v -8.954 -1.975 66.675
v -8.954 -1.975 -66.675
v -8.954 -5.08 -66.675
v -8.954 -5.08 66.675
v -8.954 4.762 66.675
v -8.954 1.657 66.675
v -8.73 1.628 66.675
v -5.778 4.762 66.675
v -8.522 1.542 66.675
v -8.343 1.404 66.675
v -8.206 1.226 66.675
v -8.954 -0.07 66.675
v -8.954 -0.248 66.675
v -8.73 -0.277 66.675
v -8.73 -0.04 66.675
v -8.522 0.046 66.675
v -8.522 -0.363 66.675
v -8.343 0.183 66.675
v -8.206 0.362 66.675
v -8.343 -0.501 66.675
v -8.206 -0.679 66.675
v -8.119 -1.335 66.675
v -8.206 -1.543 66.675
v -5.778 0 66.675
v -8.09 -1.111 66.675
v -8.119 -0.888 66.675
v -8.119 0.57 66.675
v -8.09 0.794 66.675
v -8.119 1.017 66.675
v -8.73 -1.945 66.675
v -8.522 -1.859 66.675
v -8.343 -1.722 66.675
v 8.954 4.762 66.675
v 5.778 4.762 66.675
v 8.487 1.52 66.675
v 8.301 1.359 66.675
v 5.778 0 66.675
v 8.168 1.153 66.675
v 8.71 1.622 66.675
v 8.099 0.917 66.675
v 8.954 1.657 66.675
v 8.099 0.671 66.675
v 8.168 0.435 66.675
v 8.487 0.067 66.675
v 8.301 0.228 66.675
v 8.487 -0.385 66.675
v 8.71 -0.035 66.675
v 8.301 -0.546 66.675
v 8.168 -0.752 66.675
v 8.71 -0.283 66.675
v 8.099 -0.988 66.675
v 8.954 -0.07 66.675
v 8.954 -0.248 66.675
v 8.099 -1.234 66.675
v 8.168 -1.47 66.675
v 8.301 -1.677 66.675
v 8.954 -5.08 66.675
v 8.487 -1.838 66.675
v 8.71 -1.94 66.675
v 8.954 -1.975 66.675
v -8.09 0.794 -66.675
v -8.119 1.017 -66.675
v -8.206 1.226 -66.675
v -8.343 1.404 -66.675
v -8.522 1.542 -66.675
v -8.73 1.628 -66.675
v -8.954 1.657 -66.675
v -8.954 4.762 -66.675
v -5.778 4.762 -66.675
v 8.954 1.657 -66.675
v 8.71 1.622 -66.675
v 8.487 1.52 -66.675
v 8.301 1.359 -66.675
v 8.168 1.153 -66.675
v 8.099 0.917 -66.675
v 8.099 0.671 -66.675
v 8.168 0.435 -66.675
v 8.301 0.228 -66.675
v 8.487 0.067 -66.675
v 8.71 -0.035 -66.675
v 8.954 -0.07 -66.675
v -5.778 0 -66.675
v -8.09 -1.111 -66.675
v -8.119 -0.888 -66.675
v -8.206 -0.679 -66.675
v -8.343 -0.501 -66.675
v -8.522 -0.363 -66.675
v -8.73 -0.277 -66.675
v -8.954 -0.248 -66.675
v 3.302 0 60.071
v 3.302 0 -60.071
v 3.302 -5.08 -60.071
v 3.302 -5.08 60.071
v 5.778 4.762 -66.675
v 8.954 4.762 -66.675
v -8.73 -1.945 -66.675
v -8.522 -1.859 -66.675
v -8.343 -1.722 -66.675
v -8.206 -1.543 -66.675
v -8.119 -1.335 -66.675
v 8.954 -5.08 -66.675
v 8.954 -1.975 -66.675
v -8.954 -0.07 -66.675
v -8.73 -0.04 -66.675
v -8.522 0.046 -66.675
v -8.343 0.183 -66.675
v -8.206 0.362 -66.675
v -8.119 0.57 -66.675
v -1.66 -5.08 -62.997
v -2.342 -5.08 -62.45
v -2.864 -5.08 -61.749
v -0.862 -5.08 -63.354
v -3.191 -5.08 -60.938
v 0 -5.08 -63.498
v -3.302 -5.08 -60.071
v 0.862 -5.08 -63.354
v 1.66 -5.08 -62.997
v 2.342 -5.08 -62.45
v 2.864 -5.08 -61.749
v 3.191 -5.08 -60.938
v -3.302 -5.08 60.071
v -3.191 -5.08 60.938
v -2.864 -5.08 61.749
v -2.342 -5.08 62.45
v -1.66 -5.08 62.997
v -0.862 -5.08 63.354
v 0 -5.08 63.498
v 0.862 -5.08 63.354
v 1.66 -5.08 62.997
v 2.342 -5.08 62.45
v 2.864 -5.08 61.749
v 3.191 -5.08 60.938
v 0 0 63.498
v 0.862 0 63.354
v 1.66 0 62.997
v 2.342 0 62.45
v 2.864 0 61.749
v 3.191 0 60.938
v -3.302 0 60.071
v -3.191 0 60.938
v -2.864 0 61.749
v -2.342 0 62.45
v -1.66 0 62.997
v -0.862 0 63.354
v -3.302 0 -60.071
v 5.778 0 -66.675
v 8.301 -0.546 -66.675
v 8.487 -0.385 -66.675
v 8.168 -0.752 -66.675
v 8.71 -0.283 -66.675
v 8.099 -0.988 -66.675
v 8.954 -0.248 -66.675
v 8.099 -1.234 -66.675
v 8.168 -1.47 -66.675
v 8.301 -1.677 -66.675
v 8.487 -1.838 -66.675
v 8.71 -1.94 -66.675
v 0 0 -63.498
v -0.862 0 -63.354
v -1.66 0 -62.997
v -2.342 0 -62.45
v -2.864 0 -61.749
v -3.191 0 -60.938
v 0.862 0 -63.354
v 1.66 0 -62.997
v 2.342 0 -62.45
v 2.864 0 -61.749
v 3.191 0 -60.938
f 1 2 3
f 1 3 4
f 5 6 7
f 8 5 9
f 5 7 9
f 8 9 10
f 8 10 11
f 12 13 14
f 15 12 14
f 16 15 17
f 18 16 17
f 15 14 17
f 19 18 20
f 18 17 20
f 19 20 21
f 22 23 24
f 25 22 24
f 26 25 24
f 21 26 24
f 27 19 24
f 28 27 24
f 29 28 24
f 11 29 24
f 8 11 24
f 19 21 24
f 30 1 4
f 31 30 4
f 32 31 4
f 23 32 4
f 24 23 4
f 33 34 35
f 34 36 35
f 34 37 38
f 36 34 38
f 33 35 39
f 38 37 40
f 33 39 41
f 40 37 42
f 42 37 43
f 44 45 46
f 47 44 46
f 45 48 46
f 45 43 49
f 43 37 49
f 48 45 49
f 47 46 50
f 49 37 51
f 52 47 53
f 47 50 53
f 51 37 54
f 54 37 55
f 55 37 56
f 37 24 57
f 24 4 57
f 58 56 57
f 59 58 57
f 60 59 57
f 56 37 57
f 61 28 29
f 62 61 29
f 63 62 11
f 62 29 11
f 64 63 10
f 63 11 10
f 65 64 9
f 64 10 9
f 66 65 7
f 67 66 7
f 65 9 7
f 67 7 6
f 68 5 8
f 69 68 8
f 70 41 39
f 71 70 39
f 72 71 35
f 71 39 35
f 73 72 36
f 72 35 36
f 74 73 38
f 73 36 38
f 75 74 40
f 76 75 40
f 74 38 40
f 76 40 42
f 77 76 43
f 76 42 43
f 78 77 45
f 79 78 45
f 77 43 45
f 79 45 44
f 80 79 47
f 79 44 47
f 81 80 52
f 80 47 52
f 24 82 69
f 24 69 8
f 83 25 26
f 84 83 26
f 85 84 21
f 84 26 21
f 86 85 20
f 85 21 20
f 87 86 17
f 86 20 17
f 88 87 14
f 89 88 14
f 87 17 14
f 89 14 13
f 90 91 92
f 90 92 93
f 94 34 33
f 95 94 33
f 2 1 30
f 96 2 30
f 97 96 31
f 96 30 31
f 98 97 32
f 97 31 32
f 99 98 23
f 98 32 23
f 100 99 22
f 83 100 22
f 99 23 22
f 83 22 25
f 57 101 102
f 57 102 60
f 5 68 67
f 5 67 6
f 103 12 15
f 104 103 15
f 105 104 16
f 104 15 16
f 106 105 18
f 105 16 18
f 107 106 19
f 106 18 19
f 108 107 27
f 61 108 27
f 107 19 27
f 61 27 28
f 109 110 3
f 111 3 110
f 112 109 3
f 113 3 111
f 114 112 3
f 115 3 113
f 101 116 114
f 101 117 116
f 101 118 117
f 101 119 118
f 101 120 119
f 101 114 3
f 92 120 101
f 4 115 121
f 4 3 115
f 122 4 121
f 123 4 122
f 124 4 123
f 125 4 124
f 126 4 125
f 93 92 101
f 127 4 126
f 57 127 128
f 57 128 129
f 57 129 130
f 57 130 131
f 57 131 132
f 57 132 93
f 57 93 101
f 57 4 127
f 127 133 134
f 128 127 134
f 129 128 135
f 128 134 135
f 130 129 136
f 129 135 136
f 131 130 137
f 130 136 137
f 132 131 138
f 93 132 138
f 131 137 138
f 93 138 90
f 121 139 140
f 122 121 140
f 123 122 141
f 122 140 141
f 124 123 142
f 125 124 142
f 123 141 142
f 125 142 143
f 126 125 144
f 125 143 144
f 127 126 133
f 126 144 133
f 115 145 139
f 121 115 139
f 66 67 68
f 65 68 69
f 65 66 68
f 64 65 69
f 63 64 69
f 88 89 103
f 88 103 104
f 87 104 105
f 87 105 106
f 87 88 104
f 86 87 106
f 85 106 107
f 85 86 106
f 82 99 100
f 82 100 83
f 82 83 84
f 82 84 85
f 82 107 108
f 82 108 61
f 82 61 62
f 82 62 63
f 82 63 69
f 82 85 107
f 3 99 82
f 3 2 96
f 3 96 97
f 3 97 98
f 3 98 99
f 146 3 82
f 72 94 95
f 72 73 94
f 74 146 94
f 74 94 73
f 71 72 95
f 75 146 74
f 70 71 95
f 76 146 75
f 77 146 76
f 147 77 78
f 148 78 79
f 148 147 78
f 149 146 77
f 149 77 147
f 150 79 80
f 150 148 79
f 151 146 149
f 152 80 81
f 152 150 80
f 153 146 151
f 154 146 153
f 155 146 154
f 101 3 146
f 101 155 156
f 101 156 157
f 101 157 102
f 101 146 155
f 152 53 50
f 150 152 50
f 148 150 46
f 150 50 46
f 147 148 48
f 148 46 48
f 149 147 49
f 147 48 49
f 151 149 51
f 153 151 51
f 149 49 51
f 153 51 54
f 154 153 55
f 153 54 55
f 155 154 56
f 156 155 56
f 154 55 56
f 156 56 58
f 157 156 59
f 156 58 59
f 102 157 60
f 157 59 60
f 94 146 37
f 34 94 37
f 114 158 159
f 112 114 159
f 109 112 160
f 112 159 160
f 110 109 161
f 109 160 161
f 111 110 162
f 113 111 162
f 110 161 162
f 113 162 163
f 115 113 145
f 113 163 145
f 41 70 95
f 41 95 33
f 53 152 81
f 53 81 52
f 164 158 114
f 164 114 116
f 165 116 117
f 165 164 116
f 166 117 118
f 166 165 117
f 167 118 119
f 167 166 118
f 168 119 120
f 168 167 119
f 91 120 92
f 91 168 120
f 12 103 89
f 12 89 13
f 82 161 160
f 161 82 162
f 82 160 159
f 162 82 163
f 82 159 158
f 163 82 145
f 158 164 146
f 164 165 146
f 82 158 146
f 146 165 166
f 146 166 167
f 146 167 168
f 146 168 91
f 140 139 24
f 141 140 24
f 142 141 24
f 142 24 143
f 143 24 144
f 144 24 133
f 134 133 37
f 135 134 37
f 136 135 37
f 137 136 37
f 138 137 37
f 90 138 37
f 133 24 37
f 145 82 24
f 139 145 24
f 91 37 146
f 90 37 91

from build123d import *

# Parameters (mm, degrees)
F0_W        = 11.557
F0_H        = 133.35
F0_W_2      = 6.604
F0_H_2      = 127
F0_W_3      = 3.175
F1_DEPTH    = 5.08
F2_T1_DEPTH = 5.08
F3_DEPTH    = 4.7625
F5_DEPTH    = 133.351


# Not quite as in the source:
# - a fillet or chamfer that OpenCascade refuses, or shapes differently, is made with other operations: its cross-section is extruded or revolved along the edge and cut away or added


with BuildPart() as f1:
    # F0 (on Front) → F1 (new body)
    with BuildSketch(Plane.XZ):
        Rectangle(F0_W, F0_H)
        Rectangle(F0_W_2, F0_H_2, mode=Mode.SUBTRACT)
        with Locations((-7.366, 0)):
            Rectangle(F0_W_3, F0_H)
        with Locations((7.366, 0)):
            Rectangle(F0_W_3, F0_H)
    extrude(amount=F1_DEPTH)

    # F2: fillet of radius 3.429 on 4 edges, made by hand

    # F2_s2 → F2_t1 (join)
    with BuildSketch(Plane.XZ):
        with BuildLine():
            ThreePointArc((-0.127, 63.5), (2.2976691527, 62.4956691527), (3.302, 60.071))
            Line((3.302, 60.071), (3.302, 63.5))
            Line((3.302, 63.5), (-0.127, 63.5))
        make_face()
        with BuildLine():
            ThreePointArc((-3.302, 60.071), (-2.2976691527, 62.4956691527), (0.127, 63.5))
            Line((0.127, 63.5), (-3.302, 63.5))
            Line((-3.302, 63.5), (-3.302, 60.071))
        make_face()
        with BuildLine():
            ThreePointArc((0.127, -63.5), (-2.2976691527, -62.4956691527), (-3.302, -60.071))
            Line((-3.302, -60.071), (-3.302, -63.5))
            Line((-3.302, -63.5), (0.127, -63.5))
        make_face()
        with BuildLine():
            ThreePointArc((-0.127, -63.5), (2.2976691527, -62.4956691527), (3.302, -60.071))
            Line((3.302, -60.071), (3.302, -63.5))
            Line((3.302, -63.5), (-0.127, -63.5))
        make_face()
    extrude(amount=F2_T1_DEPTH)

    # F0 (on Front) → F3 (join)
    with BuildSketch(Plane.XZ):
        with Locations((7.366, 0)):
            Rectangle(F0_W_3, F0_H)
        with Locations((-7.366, 0)):
            Rectangle(F0_W_3, F0_H)
    extrude(amount=-F3_DEPTH)

    # F4 (on face) → F5 (cut, through all)
    with BuildSketch(Plane.XY.offset(66.675)):
        with BuildLine():
            ThreePointArc((-8.9535, -0.06985), (-8.3428425838, 0.1830925838), (-8.0899, 0.79375))
            ThreePointArc((-8.0899, 0.79375), (-8.3428425838, 1.4044074162), (-8.9535, 1.65735))
            Line((-8.9535, 1.65735), (-8.9535, -0.06985))
        make_face()
        with BuildLine():
            ThreePointArc((-8.0899, -1.11125), (-8.3428425838, -0.5005925838), (-8.9535, -0.24765))
            Line((-8.9535, -0.24765), (-8.9535, -1.97485))
            ThreePointArc((-8.9535, -1.97485), (-8.3428425838, -1.7219074162), (-8.0899, -1.11125))
        make_face()
        with BuildLine():
            ThreePointArc((8.9535, -0.24765), (8.0899, -1.11125), (8.9535, -1.97485))
            Line((8.9535, -1.97485), (8.9535, -0.24765))
        make_face()
        with BuildLine():
            Line((8.9535, -0.06985), (8.9535, 1.65735))
            ThreePointArc((8.9535, 1.65735), (8.0899, 0.79375), (8.9535, -0.06985))
        make_face()
    extrude(amount=-F5_DEPTH, mode=Mode.SUBTRACT)


solid = f1.part
